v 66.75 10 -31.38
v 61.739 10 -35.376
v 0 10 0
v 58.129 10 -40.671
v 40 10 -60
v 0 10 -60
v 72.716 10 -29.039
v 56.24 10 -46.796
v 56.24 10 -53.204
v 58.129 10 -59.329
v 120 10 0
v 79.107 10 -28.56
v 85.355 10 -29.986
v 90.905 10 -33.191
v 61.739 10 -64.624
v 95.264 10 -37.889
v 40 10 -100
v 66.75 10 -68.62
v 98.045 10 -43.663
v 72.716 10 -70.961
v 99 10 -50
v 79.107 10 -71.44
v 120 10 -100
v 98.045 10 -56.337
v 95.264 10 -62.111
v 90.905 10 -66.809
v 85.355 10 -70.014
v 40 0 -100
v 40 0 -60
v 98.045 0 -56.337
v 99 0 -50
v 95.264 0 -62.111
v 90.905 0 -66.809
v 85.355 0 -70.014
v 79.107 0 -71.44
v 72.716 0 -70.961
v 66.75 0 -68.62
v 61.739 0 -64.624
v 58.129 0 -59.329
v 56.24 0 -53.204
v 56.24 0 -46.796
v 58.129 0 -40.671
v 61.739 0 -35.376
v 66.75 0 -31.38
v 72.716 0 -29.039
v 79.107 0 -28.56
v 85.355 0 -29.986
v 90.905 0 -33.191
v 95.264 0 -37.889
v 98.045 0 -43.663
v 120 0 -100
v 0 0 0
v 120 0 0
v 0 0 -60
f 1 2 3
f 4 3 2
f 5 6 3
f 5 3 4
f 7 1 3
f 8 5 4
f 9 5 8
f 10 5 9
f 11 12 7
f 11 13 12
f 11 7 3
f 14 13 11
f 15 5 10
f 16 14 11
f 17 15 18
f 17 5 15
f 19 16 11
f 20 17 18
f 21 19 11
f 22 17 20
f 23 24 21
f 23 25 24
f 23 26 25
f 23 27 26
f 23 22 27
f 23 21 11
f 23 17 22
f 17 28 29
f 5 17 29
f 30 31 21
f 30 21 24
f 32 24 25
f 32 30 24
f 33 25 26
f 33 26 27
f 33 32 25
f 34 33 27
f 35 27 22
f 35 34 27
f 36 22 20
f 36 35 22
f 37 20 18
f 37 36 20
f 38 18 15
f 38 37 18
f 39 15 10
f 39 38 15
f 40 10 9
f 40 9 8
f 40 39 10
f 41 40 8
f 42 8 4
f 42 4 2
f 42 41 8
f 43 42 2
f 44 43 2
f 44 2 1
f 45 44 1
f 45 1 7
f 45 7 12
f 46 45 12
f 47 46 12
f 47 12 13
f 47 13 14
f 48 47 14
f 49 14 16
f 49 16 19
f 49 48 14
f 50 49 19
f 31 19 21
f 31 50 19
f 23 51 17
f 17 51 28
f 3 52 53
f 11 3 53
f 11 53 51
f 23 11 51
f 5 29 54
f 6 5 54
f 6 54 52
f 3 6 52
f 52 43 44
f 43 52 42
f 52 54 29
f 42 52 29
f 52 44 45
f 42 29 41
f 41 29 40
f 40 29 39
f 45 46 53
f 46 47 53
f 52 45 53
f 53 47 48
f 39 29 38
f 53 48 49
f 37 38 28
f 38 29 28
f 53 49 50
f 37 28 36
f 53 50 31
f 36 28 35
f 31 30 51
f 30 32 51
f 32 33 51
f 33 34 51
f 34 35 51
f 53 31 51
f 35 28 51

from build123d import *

# Parameters (mm, degrees)
SKETCH_1_R      = 21.5
EXTRUDE_1_DEPTH = 10


with BuildPart() as part:
    # Эскиз1 → Бобышка-Вытянуть1 (new body)
    with BuildSketch(Plane(origin=(0, 0, 0), x_dir=(1, 0, 0), z_dir=(0, 1, 0))):
        Polygon((0, 0), (120, 0), (120, 100), (40, 100), (40, 60), (0, 60), align=None)
        with Locations((77.5, 50)):
            Circle(SKETCH_1_R, mode=Mode.SUBTRACT)
    extrude(amount=EXTRUDE_1_DEPTH)


solid = part.part
